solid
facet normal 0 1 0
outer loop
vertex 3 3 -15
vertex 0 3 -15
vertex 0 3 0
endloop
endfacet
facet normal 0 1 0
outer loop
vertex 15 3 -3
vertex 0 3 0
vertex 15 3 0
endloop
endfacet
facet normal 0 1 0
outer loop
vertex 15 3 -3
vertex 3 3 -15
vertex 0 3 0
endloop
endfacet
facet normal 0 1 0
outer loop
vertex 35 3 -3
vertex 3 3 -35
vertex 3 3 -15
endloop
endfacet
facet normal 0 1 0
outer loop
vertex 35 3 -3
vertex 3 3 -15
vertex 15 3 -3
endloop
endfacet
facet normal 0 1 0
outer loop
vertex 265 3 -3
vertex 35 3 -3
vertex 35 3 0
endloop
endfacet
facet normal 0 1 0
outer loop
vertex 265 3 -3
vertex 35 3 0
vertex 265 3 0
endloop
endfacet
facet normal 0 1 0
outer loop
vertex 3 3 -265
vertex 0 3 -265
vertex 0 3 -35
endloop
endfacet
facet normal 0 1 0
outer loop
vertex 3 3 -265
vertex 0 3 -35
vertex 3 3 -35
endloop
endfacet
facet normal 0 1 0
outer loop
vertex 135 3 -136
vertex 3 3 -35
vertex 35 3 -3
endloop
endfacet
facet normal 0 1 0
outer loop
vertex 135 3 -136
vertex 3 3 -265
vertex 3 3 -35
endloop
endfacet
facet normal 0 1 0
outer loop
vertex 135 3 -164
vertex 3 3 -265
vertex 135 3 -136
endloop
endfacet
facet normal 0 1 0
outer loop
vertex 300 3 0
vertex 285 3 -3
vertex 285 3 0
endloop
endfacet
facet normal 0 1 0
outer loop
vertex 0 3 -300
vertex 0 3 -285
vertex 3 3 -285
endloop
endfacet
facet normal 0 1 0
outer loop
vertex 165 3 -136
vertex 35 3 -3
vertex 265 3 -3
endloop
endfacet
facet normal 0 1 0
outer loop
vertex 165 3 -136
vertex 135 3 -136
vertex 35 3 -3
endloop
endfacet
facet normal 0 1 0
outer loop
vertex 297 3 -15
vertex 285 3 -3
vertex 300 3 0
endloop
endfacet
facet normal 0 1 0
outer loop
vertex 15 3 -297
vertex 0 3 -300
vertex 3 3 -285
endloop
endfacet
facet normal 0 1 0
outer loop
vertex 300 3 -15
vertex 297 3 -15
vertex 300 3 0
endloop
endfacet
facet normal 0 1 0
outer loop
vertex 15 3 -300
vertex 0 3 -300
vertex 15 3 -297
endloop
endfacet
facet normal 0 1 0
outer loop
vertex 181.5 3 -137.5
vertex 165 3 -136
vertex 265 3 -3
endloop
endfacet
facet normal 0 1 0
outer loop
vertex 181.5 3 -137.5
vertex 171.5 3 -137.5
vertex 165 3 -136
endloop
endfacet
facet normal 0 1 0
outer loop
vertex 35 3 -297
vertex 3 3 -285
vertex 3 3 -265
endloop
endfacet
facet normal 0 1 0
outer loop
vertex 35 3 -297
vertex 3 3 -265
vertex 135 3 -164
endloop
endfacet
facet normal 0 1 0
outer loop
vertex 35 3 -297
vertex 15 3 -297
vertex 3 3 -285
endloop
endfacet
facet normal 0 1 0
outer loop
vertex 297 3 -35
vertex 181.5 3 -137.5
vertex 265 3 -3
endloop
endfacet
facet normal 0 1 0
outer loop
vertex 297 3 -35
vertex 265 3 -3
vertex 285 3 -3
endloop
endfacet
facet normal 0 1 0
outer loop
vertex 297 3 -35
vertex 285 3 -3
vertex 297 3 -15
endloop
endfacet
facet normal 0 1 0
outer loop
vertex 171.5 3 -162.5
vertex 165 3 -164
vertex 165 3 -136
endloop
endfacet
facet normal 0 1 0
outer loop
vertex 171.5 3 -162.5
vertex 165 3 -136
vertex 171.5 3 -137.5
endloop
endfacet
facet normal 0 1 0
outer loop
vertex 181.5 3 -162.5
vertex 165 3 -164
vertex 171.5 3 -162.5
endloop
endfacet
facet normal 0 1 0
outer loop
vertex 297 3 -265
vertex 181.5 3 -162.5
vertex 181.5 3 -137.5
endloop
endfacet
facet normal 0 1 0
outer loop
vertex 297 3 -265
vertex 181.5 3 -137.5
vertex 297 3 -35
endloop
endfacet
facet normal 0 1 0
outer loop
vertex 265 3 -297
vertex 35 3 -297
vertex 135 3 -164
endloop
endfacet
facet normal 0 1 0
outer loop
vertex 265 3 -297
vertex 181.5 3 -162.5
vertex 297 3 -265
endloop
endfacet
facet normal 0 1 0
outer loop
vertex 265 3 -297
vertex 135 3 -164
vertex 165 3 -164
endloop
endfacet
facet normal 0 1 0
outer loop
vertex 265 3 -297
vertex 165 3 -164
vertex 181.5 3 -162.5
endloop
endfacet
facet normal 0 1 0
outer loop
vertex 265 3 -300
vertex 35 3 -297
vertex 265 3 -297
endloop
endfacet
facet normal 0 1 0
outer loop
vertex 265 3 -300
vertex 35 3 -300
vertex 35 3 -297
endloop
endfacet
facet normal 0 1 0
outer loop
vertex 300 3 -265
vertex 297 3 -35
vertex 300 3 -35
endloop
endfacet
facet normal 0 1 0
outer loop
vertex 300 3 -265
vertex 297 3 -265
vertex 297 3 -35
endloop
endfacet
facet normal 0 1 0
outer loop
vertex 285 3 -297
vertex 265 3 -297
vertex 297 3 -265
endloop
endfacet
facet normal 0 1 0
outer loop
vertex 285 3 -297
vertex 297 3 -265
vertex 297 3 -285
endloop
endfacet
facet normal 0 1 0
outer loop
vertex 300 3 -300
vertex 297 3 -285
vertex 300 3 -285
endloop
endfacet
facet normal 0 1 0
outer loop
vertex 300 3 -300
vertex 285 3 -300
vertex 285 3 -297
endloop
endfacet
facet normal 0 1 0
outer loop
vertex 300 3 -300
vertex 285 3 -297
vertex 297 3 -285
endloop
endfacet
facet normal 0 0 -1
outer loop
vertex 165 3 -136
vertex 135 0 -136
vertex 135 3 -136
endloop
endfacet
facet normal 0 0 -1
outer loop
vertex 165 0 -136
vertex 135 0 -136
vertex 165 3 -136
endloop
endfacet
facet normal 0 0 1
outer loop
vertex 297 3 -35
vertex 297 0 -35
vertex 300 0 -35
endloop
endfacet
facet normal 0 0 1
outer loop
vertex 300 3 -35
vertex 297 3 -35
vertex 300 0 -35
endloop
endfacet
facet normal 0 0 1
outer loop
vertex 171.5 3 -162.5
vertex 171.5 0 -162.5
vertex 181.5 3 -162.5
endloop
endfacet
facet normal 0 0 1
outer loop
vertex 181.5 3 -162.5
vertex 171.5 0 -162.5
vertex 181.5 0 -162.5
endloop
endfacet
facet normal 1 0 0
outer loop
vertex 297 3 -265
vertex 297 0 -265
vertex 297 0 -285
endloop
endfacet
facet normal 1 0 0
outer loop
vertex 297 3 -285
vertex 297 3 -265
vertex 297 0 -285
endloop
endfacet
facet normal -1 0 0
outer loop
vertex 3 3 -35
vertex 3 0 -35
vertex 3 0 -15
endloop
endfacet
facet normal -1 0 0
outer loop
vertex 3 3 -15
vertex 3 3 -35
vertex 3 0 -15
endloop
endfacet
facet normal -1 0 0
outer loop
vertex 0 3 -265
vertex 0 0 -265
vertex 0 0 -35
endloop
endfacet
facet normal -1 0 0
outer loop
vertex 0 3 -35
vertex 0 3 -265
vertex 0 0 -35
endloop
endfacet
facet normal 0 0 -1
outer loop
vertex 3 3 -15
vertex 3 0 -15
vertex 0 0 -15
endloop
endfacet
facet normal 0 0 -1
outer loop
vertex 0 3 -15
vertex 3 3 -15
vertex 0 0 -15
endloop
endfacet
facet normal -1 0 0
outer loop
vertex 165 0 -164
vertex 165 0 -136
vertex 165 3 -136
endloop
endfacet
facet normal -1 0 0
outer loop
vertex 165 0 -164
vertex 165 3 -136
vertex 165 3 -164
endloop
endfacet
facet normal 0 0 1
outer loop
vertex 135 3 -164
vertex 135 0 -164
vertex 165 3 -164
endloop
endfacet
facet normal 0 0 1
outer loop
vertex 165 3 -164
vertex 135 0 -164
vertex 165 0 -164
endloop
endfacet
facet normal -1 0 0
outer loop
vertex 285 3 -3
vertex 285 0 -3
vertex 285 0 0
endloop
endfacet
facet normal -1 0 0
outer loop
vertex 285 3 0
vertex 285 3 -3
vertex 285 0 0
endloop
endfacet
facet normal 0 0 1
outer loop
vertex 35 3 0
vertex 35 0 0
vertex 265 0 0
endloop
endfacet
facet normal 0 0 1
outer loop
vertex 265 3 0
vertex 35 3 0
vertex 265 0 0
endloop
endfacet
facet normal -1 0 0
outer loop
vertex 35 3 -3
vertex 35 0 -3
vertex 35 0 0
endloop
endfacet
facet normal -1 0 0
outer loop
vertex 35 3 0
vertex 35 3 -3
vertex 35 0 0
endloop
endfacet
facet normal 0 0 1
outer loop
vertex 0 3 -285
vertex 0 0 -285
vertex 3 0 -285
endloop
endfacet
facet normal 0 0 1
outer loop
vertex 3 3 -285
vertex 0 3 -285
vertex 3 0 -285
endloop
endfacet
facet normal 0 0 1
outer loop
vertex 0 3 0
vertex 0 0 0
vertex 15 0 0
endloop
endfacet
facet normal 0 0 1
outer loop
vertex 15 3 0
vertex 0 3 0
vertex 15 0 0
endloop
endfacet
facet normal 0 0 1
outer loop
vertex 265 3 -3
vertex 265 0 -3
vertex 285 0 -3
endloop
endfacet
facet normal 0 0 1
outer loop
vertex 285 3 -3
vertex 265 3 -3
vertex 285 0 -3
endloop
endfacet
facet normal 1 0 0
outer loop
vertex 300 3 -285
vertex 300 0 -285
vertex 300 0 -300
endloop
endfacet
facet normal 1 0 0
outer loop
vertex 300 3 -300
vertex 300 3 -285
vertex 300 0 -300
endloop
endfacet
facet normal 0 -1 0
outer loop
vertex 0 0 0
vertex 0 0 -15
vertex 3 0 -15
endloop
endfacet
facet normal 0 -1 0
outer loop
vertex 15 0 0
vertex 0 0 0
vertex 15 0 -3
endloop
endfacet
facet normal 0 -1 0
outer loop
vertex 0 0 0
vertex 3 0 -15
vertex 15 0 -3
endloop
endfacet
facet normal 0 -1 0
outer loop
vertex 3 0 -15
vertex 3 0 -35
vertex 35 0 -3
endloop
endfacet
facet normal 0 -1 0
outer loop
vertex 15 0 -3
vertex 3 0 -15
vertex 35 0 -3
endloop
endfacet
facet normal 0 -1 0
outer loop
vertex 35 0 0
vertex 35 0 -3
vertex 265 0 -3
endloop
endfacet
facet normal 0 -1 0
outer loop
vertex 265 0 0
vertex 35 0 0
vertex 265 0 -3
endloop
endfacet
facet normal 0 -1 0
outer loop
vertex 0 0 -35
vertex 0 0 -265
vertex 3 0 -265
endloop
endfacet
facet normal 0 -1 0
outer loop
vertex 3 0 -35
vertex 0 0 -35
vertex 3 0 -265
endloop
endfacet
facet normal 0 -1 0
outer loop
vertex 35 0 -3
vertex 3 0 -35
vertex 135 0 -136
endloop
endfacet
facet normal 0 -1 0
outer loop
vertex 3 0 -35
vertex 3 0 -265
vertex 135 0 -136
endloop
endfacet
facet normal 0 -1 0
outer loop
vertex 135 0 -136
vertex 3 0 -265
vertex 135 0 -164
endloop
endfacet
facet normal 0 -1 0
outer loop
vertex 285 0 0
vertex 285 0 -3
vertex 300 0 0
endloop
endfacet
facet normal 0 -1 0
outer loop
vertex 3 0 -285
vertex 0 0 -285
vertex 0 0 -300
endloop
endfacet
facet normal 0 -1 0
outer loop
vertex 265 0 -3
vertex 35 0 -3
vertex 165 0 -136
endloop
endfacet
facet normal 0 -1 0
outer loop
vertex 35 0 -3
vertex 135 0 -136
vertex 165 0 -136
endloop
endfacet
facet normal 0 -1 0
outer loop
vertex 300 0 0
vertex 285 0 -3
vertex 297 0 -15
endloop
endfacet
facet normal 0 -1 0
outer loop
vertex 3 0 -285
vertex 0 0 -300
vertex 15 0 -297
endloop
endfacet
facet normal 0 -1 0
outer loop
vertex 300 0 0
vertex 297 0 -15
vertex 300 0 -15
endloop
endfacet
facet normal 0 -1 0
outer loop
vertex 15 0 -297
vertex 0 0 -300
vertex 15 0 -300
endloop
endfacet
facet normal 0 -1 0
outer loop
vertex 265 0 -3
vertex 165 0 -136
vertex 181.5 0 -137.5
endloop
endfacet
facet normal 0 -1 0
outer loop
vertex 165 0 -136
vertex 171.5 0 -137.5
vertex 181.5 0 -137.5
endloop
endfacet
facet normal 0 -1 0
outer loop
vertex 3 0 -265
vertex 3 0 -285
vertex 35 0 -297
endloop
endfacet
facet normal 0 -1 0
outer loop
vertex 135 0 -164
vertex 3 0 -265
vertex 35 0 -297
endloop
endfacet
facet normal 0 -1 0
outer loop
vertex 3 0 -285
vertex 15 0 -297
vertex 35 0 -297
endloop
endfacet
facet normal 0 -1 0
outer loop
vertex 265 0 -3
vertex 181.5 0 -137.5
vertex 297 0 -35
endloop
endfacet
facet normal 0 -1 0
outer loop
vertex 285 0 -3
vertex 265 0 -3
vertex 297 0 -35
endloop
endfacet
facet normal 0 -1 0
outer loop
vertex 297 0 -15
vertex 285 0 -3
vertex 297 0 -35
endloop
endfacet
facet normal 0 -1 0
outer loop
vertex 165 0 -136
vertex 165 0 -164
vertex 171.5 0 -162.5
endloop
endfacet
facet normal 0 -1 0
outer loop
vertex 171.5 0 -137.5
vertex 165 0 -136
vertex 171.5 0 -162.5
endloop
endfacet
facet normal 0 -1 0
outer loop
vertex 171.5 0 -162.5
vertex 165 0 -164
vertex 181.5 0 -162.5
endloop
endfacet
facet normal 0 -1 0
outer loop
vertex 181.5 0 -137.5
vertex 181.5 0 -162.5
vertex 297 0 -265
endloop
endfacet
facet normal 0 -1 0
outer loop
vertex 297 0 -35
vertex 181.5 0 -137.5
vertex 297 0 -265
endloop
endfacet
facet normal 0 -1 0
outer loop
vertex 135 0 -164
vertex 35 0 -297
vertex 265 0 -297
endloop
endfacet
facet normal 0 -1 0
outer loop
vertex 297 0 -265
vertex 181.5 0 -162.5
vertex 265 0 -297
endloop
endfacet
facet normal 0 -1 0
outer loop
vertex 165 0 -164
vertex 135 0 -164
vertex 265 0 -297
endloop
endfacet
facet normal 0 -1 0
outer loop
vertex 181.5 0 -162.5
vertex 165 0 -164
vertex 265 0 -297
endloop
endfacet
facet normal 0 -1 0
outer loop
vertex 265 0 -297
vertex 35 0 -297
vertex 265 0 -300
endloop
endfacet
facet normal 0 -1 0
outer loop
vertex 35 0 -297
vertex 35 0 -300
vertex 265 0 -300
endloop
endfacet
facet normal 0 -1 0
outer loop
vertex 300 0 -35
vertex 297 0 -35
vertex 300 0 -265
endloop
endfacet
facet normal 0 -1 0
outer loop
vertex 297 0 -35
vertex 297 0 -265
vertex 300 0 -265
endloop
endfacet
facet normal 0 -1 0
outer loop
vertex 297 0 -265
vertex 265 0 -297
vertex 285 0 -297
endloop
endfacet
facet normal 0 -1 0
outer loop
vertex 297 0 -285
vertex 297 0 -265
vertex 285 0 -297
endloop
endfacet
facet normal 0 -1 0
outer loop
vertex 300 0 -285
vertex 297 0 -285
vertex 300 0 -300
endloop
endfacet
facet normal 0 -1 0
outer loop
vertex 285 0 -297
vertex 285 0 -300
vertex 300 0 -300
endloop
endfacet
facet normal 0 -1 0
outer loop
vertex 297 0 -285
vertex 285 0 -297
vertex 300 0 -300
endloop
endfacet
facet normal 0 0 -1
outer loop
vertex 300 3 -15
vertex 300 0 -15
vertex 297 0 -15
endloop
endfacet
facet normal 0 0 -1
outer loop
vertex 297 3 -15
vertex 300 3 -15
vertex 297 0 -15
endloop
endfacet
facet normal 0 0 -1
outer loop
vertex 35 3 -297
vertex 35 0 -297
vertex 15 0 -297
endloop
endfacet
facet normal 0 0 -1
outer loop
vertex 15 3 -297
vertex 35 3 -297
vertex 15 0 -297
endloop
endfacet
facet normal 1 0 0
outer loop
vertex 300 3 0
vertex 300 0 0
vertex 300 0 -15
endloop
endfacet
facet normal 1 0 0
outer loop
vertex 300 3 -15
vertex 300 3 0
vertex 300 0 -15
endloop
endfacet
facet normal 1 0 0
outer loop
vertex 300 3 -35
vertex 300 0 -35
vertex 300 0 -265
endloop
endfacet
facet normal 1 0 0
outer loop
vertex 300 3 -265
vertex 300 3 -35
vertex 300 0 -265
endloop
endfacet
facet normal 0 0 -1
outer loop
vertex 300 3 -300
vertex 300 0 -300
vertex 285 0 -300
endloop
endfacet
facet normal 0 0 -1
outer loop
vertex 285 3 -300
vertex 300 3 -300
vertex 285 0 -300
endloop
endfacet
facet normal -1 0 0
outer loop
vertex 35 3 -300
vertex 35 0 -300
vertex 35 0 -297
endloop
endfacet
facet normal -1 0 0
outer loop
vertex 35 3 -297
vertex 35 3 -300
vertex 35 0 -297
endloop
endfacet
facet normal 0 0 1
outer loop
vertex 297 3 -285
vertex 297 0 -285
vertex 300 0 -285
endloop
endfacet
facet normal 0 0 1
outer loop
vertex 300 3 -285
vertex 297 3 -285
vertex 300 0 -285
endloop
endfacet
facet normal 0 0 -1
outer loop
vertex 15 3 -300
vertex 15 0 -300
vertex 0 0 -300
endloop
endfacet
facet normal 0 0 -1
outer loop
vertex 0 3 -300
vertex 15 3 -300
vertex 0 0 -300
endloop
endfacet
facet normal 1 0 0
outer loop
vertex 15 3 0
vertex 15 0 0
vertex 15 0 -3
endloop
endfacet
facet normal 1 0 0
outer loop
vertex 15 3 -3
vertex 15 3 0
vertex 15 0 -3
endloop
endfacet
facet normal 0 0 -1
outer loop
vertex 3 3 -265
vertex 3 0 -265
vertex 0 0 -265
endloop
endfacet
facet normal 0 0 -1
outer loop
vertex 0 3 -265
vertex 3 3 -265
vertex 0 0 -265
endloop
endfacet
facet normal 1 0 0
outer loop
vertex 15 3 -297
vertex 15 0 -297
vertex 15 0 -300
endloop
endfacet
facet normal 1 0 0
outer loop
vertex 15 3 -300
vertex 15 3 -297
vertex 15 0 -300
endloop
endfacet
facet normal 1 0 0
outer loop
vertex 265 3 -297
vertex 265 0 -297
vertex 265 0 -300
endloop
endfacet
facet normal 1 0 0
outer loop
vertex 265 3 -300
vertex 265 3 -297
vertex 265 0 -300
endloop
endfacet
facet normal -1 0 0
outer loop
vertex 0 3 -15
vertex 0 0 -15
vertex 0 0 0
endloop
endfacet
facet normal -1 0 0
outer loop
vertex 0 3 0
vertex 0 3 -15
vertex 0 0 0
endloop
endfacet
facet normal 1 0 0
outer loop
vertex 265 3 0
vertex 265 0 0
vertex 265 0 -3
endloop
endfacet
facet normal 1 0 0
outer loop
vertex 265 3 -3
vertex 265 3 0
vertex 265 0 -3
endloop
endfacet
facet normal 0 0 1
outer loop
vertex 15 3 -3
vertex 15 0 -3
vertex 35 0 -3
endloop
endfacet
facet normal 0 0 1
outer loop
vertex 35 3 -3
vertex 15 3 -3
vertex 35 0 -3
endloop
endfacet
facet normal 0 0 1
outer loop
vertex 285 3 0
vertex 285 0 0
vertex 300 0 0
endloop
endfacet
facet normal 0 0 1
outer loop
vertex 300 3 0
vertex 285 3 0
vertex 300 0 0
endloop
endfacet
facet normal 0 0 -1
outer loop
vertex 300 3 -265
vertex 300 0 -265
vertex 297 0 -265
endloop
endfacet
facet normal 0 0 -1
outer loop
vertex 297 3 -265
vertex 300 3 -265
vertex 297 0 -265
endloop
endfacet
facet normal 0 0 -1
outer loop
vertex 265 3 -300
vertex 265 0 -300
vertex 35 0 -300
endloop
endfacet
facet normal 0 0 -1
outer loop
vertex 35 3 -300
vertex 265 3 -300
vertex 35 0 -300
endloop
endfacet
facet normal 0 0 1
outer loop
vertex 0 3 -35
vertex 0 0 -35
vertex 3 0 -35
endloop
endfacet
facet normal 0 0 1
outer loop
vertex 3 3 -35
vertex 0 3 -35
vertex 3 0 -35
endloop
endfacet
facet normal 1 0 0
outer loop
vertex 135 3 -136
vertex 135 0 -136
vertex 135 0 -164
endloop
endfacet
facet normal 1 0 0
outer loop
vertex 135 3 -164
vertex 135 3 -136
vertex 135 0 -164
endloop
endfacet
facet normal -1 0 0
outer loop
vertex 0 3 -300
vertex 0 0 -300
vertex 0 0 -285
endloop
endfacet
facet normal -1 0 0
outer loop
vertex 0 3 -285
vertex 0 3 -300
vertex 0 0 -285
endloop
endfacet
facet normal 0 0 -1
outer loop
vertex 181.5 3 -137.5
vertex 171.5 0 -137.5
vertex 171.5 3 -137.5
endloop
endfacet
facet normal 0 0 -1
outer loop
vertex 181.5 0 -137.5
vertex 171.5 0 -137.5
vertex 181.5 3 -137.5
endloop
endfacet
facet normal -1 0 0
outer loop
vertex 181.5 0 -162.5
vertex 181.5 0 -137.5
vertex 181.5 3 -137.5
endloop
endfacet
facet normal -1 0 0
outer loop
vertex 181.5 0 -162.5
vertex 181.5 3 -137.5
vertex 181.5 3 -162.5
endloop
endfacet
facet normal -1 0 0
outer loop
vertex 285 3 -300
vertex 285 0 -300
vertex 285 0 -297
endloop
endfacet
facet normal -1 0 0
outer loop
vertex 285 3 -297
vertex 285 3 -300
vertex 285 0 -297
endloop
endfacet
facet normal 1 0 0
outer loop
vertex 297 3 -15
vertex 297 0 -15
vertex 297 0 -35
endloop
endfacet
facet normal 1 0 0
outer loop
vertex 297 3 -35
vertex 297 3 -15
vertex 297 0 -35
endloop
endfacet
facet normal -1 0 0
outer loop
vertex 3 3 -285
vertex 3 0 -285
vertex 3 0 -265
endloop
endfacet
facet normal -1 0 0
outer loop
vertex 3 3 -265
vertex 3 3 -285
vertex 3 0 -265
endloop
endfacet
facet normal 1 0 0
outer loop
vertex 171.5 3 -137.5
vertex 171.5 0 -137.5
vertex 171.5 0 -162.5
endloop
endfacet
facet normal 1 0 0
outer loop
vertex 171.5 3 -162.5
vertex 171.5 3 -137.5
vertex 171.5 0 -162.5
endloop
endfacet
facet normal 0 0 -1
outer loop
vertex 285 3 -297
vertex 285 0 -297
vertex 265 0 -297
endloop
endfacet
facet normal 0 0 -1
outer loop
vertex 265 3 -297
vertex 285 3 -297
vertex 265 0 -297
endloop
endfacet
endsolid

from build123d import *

# Parameters (mm, degrees)
CROQUIS1_W              = 30
CROQUIS1_H              = 28
CROQUIS1_W_2            = 10
CROQUIS1_H_2            = 25
SALIENTE_EXTRUIR2_DEPTH = 3


with BuildPart() as part:
    # Croquis1 → Saliente-Extruir2 (new body)
    with BuildSketch(Plane(origin=(0, 0, 0), x_dir=(1, 0, 0), z_dir=(0, 1, 0))):
        Polygon((0, 0), (15, 0), (15, 3), (35, 3), (35, 0), (265, 0), (265, 3), (285, 3), (285, 0), (300, 0), (300, 15), (297, 15), (297, 35), (300, 35), (300, 265), (297, 265), (297, 285), (300, 285), (300, 300), (285, 300), (285, 297), (265, 297), (265, 300), (35, 300), (35, 297), (15, 297), (15, 300), (0, 300), (0, 285), (3, 285), (3, 265), (0, 265), (0, 35), (3, 35), (3, 15), (0, 15), align=None)
        with Locations((150, 150)):
            Rectangle(CROQUIS1_W, CROQUIS1_H, mode=Mode.SUBTRACT)
        with Locations((176.5, 150)):
            Rectangle(CROQUIS1_W_2, CROQUIS1_H_2, mode=Mode.SUBTRACT)
    extrude(amount=SALIENTE_EXTRUIR2_DEPTH)


solid = part.part
